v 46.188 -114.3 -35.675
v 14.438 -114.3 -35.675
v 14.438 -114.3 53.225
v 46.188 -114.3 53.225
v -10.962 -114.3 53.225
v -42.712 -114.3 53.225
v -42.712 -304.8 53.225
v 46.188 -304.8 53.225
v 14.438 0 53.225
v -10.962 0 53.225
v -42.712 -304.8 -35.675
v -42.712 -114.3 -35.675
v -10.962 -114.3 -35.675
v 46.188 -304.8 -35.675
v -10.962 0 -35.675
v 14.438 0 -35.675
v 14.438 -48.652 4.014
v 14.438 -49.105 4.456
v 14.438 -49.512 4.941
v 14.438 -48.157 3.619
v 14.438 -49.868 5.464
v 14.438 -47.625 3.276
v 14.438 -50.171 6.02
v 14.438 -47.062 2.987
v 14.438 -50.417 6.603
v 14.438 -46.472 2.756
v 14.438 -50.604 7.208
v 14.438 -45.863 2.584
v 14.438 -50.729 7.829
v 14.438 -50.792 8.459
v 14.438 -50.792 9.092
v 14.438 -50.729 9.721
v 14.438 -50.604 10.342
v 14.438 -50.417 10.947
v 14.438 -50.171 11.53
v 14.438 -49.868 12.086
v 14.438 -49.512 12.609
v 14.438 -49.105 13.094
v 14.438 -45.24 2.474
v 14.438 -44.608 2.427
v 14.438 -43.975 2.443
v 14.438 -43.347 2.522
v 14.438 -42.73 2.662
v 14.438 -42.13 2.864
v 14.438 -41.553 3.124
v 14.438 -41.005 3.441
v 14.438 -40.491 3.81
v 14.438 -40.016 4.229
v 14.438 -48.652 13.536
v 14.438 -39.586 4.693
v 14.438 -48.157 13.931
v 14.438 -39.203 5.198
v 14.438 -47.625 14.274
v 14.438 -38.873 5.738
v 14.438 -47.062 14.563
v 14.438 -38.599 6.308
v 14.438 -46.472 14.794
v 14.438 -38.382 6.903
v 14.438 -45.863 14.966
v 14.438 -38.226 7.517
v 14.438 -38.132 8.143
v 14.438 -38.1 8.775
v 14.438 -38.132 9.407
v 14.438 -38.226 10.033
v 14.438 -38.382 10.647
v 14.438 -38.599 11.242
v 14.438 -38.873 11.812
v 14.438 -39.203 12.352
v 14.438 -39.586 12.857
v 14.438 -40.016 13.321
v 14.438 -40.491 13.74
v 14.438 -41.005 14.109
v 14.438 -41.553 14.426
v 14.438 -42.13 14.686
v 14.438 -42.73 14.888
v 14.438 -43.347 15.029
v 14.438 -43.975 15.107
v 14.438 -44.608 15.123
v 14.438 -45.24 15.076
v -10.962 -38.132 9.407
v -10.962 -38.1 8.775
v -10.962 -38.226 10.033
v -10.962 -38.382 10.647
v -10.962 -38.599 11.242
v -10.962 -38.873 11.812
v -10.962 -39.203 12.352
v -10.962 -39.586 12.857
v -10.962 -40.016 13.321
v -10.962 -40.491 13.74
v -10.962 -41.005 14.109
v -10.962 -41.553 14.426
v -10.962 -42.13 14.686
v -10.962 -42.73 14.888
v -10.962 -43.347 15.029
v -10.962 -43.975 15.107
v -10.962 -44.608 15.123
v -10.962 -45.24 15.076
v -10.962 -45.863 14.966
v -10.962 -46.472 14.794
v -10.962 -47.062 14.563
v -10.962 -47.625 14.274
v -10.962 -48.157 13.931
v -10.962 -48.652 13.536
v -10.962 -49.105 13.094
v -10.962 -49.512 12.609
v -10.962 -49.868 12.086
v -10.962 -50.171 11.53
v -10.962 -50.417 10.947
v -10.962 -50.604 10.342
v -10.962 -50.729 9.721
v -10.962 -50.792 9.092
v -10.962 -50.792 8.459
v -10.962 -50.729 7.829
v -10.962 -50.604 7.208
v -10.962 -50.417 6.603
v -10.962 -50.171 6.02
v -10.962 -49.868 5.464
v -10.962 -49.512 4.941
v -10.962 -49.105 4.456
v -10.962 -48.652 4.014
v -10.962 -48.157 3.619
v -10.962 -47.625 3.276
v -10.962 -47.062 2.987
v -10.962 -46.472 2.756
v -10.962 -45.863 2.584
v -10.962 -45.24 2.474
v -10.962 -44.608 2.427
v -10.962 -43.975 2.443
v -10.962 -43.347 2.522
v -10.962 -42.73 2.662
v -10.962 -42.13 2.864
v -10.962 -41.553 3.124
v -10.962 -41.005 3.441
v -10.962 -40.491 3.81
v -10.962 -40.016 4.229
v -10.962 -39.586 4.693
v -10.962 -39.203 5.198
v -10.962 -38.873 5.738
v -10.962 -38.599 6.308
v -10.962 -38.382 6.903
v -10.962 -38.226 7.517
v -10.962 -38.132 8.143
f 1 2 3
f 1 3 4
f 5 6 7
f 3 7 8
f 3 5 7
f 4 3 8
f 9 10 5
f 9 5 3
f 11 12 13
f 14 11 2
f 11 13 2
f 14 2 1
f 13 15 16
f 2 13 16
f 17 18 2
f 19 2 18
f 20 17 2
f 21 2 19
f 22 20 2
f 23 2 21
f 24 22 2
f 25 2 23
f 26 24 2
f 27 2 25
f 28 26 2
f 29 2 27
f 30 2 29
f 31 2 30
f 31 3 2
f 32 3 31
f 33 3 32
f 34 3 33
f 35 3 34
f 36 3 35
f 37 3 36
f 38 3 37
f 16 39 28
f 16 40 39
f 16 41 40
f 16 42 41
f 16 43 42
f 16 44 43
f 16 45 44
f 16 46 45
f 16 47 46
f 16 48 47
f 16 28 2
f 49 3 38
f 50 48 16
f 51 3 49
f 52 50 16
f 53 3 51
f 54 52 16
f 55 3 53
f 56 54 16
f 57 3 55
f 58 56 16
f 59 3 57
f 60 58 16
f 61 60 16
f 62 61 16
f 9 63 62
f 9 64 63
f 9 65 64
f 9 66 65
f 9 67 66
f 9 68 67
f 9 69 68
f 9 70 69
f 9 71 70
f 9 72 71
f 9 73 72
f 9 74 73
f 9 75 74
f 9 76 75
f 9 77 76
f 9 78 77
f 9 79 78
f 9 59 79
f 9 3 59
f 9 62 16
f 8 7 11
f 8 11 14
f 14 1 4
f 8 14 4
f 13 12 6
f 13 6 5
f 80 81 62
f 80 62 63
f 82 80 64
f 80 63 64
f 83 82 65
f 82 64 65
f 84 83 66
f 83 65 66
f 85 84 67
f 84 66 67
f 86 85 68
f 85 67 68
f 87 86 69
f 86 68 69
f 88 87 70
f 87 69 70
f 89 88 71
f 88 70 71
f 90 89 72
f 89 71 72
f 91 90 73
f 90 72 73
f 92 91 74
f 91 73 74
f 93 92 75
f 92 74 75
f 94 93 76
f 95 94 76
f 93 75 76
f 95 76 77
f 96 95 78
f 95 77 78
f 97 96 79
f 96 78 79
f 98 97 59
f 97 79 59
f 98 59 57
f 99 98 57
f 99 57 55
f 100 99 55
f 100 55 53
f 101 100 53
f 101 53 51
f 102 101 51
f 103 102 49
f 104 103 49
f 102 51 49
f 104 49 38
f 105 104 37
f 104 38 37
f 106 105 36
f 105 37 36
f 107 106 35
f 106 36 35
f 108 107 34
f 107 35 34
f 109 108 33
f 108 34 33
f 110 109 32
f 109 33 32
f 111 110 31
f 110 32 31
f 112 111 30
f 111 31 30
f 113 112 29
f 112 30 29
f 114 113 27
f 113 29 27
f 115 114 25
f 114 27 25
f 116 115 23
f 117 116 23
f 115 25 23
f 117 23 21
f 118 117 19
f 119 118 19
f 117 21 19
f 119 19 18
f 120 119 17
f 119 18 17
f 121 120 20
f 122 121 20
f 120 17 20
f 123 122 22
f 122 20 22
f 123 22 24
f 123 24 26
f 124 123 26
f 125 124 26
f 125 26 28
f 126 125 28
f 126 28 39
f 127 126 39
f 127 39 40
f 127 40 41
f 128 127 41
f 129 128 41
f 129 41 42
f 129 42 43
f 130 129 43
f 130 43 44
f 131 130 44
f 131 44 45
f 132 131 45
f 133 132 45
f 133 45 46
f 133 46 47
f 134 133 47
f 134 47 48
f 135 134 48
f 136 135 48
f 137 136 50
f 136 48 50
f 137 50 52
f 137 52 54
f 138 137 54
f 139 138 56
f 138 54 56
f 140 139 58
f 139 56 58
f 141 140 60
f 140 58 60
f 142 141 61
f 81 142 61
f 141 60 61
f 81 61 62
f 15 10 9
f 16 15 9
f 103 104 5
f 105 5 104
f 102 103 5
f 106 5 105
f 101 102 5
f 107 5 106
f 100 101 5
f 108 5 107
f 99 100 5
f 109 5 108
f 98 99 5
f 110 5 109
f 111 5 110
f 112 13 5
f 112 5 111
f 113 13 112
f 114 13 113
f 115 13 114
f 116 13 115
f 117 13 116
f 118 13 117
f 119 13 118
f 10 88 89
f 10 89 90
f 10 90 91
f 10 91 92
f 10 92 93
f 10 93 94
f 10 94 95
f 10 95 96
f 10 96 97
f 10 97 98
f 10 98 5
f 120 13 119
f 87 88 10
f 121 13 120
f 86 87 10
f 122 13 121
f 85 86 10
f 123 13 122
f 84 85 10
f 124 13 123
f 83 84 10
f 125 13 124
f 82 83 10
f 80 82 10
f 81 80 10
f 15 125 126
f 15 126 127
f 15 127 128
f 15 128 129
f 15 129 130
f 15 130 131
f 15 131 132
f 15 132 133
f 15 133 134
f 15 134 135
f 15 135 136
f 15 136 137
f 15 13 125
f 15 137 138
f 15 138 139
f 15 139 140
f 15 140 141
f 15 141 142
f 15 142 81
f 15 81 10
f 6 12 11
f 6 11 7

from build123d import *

# Parameters (mm, degrees)
F0_W     = 88.9
F0_H     = 88.9
F1_DEPTH = 304.8
F2_W     = 31.75
F2_H     = 114.3
F3_DEPTH = 127
F4_R     = 6.35
F5_DEPTH = 127


with BuildPart() as f1:
    # F0 (on Front) → F1 (new body)
    with BuildSketch(Plane.XZ):
        with Locations((1.7375517637, 8.7750459692)):
            Rectangle(F0_W, F0_H)
    extrude(amount=F1_DEPTH)

    # F2 (on Top) → F3 (cut, symmetric)
    with BuildSketch(Plane.XY):
        with Locations((-26.8374482363, -57.15)):
            Rectangle(F2_W, F2_H)
        with Locations((30.3125517637, -57.15)):
            Rectangle(F2_W, F2_H)
    extrude(amount=F3_DEPTH, both=True, mode=Mode.SUBTRACT)

    # F4 (on face) → F5 (cut, symmetric)
    with BuildSketch(Plane.YZ.offset(14.4375517637)):
        with Locations((-44.45, 8.7750459692)):
            Circle(F4_R)
    extrude(amount=F5_DEPTH, both=True, mode=Mode.SUBTRACT)


solid = f1.part
